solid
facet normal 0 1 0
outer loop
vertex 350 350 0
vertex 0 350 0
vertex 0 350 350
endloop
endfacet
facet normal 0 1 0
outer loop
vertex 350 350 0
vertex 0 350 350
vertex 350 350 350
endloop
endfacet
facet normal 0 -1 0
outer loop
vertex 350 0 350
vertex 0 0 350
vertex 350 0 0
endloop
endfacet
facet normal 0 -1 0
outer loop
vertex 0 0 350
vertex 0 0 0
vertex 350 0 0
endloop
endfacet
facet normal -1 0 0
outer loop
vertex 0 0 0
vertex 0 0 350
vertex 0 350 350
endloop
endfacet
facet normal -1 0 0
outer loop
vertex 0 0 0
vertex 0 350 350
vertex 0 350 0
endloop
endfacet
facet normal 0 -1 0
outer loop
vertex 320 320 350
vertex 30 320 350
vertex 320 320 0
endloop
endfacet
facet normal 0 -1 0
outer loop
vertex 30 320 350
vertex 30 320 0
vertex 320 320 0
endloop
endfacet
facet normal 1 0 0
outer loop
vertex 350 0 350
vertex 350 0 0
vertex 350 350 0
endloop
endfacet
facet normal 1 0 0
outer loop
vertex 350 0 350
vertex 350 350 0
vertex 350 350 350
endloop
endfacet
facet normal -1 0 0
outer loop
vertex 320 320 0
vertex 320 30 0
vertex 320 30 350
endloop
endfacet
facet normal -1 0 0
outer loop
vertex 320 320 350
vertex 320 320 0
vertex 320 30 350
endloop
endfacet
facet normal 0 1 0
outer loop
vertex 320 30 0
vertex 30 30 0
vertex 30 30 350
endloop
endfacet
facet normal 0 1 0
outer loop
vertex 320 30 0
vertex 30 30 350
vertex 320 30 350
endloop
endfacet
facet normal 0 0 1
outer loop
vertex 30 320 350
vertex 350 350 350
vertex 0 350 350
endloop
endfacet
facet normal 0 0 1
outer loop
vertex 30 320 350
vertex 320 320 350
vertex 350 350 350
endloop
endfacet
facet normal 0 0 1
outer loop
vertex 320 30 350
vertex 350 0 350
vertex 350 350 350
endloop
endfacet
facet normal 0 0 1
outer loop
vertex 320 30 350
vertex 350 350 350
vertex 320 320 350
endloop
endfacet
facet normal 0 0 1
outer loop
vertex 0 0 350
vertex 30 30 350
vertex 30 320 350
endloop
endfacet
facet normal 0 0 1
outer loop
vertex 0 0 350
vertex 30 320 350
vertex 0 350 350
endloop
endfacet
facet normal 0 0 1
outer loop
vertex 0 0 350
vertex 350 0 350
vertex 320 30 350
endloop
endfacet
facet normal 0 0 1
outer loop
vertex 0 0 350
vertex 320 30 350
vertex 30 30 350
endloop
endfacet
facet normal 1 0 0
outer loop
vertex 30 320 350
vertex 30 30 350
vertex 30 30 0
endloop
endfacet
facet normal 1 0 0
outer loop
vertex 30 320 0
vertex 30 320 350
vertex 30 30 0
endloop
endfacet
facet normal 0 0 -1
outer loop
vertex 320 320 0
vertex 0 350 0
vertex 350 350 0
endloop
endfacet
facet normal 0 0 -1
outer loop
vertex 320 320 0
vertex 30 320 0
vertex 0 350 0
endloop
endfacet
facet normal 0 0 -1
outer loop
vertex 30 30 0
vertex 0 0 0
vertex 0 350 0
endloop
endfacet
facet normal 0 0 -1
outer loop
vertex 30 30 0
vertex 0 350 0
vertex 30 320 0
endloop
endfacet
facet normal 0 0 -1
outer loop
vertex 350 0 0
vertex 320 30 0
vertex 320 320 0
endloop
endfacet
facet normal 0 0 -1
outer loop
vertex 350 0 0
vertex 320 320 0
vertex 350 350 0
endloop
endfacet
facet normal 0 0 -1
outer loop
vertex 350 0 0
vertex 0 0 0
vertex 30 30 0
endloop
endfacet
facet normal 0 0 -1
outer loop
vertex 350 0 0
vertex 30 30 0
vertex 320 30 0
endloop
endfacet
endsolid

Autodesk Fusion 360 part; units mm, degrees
sketch "Esquisse1" plane through (0, 0, 0) normal (0, 1, 0) x (1, 0, 0)
  line L0 (0, 0) -> (350, 0)
  line L1 (350, 0) -> (350, -350)
  line L2 (350, -350) -> (0, -350)
  line L3 (0, -350) -> (0, 0)
  dimension "d1" = 350
  dimension "d2" = 350
extrude "Extrusion1" add sketch "Esquisse1" along normal blind 350
sketch "Esquisse2" plane through (0, 0, 0) normal (0, 0, 1) x (1, 0, 0)
shell "Coque1" thickness 30 removed faces 2 at (116.6667, 116.6667, 0) at (233.3333, 116.6667, 350)
